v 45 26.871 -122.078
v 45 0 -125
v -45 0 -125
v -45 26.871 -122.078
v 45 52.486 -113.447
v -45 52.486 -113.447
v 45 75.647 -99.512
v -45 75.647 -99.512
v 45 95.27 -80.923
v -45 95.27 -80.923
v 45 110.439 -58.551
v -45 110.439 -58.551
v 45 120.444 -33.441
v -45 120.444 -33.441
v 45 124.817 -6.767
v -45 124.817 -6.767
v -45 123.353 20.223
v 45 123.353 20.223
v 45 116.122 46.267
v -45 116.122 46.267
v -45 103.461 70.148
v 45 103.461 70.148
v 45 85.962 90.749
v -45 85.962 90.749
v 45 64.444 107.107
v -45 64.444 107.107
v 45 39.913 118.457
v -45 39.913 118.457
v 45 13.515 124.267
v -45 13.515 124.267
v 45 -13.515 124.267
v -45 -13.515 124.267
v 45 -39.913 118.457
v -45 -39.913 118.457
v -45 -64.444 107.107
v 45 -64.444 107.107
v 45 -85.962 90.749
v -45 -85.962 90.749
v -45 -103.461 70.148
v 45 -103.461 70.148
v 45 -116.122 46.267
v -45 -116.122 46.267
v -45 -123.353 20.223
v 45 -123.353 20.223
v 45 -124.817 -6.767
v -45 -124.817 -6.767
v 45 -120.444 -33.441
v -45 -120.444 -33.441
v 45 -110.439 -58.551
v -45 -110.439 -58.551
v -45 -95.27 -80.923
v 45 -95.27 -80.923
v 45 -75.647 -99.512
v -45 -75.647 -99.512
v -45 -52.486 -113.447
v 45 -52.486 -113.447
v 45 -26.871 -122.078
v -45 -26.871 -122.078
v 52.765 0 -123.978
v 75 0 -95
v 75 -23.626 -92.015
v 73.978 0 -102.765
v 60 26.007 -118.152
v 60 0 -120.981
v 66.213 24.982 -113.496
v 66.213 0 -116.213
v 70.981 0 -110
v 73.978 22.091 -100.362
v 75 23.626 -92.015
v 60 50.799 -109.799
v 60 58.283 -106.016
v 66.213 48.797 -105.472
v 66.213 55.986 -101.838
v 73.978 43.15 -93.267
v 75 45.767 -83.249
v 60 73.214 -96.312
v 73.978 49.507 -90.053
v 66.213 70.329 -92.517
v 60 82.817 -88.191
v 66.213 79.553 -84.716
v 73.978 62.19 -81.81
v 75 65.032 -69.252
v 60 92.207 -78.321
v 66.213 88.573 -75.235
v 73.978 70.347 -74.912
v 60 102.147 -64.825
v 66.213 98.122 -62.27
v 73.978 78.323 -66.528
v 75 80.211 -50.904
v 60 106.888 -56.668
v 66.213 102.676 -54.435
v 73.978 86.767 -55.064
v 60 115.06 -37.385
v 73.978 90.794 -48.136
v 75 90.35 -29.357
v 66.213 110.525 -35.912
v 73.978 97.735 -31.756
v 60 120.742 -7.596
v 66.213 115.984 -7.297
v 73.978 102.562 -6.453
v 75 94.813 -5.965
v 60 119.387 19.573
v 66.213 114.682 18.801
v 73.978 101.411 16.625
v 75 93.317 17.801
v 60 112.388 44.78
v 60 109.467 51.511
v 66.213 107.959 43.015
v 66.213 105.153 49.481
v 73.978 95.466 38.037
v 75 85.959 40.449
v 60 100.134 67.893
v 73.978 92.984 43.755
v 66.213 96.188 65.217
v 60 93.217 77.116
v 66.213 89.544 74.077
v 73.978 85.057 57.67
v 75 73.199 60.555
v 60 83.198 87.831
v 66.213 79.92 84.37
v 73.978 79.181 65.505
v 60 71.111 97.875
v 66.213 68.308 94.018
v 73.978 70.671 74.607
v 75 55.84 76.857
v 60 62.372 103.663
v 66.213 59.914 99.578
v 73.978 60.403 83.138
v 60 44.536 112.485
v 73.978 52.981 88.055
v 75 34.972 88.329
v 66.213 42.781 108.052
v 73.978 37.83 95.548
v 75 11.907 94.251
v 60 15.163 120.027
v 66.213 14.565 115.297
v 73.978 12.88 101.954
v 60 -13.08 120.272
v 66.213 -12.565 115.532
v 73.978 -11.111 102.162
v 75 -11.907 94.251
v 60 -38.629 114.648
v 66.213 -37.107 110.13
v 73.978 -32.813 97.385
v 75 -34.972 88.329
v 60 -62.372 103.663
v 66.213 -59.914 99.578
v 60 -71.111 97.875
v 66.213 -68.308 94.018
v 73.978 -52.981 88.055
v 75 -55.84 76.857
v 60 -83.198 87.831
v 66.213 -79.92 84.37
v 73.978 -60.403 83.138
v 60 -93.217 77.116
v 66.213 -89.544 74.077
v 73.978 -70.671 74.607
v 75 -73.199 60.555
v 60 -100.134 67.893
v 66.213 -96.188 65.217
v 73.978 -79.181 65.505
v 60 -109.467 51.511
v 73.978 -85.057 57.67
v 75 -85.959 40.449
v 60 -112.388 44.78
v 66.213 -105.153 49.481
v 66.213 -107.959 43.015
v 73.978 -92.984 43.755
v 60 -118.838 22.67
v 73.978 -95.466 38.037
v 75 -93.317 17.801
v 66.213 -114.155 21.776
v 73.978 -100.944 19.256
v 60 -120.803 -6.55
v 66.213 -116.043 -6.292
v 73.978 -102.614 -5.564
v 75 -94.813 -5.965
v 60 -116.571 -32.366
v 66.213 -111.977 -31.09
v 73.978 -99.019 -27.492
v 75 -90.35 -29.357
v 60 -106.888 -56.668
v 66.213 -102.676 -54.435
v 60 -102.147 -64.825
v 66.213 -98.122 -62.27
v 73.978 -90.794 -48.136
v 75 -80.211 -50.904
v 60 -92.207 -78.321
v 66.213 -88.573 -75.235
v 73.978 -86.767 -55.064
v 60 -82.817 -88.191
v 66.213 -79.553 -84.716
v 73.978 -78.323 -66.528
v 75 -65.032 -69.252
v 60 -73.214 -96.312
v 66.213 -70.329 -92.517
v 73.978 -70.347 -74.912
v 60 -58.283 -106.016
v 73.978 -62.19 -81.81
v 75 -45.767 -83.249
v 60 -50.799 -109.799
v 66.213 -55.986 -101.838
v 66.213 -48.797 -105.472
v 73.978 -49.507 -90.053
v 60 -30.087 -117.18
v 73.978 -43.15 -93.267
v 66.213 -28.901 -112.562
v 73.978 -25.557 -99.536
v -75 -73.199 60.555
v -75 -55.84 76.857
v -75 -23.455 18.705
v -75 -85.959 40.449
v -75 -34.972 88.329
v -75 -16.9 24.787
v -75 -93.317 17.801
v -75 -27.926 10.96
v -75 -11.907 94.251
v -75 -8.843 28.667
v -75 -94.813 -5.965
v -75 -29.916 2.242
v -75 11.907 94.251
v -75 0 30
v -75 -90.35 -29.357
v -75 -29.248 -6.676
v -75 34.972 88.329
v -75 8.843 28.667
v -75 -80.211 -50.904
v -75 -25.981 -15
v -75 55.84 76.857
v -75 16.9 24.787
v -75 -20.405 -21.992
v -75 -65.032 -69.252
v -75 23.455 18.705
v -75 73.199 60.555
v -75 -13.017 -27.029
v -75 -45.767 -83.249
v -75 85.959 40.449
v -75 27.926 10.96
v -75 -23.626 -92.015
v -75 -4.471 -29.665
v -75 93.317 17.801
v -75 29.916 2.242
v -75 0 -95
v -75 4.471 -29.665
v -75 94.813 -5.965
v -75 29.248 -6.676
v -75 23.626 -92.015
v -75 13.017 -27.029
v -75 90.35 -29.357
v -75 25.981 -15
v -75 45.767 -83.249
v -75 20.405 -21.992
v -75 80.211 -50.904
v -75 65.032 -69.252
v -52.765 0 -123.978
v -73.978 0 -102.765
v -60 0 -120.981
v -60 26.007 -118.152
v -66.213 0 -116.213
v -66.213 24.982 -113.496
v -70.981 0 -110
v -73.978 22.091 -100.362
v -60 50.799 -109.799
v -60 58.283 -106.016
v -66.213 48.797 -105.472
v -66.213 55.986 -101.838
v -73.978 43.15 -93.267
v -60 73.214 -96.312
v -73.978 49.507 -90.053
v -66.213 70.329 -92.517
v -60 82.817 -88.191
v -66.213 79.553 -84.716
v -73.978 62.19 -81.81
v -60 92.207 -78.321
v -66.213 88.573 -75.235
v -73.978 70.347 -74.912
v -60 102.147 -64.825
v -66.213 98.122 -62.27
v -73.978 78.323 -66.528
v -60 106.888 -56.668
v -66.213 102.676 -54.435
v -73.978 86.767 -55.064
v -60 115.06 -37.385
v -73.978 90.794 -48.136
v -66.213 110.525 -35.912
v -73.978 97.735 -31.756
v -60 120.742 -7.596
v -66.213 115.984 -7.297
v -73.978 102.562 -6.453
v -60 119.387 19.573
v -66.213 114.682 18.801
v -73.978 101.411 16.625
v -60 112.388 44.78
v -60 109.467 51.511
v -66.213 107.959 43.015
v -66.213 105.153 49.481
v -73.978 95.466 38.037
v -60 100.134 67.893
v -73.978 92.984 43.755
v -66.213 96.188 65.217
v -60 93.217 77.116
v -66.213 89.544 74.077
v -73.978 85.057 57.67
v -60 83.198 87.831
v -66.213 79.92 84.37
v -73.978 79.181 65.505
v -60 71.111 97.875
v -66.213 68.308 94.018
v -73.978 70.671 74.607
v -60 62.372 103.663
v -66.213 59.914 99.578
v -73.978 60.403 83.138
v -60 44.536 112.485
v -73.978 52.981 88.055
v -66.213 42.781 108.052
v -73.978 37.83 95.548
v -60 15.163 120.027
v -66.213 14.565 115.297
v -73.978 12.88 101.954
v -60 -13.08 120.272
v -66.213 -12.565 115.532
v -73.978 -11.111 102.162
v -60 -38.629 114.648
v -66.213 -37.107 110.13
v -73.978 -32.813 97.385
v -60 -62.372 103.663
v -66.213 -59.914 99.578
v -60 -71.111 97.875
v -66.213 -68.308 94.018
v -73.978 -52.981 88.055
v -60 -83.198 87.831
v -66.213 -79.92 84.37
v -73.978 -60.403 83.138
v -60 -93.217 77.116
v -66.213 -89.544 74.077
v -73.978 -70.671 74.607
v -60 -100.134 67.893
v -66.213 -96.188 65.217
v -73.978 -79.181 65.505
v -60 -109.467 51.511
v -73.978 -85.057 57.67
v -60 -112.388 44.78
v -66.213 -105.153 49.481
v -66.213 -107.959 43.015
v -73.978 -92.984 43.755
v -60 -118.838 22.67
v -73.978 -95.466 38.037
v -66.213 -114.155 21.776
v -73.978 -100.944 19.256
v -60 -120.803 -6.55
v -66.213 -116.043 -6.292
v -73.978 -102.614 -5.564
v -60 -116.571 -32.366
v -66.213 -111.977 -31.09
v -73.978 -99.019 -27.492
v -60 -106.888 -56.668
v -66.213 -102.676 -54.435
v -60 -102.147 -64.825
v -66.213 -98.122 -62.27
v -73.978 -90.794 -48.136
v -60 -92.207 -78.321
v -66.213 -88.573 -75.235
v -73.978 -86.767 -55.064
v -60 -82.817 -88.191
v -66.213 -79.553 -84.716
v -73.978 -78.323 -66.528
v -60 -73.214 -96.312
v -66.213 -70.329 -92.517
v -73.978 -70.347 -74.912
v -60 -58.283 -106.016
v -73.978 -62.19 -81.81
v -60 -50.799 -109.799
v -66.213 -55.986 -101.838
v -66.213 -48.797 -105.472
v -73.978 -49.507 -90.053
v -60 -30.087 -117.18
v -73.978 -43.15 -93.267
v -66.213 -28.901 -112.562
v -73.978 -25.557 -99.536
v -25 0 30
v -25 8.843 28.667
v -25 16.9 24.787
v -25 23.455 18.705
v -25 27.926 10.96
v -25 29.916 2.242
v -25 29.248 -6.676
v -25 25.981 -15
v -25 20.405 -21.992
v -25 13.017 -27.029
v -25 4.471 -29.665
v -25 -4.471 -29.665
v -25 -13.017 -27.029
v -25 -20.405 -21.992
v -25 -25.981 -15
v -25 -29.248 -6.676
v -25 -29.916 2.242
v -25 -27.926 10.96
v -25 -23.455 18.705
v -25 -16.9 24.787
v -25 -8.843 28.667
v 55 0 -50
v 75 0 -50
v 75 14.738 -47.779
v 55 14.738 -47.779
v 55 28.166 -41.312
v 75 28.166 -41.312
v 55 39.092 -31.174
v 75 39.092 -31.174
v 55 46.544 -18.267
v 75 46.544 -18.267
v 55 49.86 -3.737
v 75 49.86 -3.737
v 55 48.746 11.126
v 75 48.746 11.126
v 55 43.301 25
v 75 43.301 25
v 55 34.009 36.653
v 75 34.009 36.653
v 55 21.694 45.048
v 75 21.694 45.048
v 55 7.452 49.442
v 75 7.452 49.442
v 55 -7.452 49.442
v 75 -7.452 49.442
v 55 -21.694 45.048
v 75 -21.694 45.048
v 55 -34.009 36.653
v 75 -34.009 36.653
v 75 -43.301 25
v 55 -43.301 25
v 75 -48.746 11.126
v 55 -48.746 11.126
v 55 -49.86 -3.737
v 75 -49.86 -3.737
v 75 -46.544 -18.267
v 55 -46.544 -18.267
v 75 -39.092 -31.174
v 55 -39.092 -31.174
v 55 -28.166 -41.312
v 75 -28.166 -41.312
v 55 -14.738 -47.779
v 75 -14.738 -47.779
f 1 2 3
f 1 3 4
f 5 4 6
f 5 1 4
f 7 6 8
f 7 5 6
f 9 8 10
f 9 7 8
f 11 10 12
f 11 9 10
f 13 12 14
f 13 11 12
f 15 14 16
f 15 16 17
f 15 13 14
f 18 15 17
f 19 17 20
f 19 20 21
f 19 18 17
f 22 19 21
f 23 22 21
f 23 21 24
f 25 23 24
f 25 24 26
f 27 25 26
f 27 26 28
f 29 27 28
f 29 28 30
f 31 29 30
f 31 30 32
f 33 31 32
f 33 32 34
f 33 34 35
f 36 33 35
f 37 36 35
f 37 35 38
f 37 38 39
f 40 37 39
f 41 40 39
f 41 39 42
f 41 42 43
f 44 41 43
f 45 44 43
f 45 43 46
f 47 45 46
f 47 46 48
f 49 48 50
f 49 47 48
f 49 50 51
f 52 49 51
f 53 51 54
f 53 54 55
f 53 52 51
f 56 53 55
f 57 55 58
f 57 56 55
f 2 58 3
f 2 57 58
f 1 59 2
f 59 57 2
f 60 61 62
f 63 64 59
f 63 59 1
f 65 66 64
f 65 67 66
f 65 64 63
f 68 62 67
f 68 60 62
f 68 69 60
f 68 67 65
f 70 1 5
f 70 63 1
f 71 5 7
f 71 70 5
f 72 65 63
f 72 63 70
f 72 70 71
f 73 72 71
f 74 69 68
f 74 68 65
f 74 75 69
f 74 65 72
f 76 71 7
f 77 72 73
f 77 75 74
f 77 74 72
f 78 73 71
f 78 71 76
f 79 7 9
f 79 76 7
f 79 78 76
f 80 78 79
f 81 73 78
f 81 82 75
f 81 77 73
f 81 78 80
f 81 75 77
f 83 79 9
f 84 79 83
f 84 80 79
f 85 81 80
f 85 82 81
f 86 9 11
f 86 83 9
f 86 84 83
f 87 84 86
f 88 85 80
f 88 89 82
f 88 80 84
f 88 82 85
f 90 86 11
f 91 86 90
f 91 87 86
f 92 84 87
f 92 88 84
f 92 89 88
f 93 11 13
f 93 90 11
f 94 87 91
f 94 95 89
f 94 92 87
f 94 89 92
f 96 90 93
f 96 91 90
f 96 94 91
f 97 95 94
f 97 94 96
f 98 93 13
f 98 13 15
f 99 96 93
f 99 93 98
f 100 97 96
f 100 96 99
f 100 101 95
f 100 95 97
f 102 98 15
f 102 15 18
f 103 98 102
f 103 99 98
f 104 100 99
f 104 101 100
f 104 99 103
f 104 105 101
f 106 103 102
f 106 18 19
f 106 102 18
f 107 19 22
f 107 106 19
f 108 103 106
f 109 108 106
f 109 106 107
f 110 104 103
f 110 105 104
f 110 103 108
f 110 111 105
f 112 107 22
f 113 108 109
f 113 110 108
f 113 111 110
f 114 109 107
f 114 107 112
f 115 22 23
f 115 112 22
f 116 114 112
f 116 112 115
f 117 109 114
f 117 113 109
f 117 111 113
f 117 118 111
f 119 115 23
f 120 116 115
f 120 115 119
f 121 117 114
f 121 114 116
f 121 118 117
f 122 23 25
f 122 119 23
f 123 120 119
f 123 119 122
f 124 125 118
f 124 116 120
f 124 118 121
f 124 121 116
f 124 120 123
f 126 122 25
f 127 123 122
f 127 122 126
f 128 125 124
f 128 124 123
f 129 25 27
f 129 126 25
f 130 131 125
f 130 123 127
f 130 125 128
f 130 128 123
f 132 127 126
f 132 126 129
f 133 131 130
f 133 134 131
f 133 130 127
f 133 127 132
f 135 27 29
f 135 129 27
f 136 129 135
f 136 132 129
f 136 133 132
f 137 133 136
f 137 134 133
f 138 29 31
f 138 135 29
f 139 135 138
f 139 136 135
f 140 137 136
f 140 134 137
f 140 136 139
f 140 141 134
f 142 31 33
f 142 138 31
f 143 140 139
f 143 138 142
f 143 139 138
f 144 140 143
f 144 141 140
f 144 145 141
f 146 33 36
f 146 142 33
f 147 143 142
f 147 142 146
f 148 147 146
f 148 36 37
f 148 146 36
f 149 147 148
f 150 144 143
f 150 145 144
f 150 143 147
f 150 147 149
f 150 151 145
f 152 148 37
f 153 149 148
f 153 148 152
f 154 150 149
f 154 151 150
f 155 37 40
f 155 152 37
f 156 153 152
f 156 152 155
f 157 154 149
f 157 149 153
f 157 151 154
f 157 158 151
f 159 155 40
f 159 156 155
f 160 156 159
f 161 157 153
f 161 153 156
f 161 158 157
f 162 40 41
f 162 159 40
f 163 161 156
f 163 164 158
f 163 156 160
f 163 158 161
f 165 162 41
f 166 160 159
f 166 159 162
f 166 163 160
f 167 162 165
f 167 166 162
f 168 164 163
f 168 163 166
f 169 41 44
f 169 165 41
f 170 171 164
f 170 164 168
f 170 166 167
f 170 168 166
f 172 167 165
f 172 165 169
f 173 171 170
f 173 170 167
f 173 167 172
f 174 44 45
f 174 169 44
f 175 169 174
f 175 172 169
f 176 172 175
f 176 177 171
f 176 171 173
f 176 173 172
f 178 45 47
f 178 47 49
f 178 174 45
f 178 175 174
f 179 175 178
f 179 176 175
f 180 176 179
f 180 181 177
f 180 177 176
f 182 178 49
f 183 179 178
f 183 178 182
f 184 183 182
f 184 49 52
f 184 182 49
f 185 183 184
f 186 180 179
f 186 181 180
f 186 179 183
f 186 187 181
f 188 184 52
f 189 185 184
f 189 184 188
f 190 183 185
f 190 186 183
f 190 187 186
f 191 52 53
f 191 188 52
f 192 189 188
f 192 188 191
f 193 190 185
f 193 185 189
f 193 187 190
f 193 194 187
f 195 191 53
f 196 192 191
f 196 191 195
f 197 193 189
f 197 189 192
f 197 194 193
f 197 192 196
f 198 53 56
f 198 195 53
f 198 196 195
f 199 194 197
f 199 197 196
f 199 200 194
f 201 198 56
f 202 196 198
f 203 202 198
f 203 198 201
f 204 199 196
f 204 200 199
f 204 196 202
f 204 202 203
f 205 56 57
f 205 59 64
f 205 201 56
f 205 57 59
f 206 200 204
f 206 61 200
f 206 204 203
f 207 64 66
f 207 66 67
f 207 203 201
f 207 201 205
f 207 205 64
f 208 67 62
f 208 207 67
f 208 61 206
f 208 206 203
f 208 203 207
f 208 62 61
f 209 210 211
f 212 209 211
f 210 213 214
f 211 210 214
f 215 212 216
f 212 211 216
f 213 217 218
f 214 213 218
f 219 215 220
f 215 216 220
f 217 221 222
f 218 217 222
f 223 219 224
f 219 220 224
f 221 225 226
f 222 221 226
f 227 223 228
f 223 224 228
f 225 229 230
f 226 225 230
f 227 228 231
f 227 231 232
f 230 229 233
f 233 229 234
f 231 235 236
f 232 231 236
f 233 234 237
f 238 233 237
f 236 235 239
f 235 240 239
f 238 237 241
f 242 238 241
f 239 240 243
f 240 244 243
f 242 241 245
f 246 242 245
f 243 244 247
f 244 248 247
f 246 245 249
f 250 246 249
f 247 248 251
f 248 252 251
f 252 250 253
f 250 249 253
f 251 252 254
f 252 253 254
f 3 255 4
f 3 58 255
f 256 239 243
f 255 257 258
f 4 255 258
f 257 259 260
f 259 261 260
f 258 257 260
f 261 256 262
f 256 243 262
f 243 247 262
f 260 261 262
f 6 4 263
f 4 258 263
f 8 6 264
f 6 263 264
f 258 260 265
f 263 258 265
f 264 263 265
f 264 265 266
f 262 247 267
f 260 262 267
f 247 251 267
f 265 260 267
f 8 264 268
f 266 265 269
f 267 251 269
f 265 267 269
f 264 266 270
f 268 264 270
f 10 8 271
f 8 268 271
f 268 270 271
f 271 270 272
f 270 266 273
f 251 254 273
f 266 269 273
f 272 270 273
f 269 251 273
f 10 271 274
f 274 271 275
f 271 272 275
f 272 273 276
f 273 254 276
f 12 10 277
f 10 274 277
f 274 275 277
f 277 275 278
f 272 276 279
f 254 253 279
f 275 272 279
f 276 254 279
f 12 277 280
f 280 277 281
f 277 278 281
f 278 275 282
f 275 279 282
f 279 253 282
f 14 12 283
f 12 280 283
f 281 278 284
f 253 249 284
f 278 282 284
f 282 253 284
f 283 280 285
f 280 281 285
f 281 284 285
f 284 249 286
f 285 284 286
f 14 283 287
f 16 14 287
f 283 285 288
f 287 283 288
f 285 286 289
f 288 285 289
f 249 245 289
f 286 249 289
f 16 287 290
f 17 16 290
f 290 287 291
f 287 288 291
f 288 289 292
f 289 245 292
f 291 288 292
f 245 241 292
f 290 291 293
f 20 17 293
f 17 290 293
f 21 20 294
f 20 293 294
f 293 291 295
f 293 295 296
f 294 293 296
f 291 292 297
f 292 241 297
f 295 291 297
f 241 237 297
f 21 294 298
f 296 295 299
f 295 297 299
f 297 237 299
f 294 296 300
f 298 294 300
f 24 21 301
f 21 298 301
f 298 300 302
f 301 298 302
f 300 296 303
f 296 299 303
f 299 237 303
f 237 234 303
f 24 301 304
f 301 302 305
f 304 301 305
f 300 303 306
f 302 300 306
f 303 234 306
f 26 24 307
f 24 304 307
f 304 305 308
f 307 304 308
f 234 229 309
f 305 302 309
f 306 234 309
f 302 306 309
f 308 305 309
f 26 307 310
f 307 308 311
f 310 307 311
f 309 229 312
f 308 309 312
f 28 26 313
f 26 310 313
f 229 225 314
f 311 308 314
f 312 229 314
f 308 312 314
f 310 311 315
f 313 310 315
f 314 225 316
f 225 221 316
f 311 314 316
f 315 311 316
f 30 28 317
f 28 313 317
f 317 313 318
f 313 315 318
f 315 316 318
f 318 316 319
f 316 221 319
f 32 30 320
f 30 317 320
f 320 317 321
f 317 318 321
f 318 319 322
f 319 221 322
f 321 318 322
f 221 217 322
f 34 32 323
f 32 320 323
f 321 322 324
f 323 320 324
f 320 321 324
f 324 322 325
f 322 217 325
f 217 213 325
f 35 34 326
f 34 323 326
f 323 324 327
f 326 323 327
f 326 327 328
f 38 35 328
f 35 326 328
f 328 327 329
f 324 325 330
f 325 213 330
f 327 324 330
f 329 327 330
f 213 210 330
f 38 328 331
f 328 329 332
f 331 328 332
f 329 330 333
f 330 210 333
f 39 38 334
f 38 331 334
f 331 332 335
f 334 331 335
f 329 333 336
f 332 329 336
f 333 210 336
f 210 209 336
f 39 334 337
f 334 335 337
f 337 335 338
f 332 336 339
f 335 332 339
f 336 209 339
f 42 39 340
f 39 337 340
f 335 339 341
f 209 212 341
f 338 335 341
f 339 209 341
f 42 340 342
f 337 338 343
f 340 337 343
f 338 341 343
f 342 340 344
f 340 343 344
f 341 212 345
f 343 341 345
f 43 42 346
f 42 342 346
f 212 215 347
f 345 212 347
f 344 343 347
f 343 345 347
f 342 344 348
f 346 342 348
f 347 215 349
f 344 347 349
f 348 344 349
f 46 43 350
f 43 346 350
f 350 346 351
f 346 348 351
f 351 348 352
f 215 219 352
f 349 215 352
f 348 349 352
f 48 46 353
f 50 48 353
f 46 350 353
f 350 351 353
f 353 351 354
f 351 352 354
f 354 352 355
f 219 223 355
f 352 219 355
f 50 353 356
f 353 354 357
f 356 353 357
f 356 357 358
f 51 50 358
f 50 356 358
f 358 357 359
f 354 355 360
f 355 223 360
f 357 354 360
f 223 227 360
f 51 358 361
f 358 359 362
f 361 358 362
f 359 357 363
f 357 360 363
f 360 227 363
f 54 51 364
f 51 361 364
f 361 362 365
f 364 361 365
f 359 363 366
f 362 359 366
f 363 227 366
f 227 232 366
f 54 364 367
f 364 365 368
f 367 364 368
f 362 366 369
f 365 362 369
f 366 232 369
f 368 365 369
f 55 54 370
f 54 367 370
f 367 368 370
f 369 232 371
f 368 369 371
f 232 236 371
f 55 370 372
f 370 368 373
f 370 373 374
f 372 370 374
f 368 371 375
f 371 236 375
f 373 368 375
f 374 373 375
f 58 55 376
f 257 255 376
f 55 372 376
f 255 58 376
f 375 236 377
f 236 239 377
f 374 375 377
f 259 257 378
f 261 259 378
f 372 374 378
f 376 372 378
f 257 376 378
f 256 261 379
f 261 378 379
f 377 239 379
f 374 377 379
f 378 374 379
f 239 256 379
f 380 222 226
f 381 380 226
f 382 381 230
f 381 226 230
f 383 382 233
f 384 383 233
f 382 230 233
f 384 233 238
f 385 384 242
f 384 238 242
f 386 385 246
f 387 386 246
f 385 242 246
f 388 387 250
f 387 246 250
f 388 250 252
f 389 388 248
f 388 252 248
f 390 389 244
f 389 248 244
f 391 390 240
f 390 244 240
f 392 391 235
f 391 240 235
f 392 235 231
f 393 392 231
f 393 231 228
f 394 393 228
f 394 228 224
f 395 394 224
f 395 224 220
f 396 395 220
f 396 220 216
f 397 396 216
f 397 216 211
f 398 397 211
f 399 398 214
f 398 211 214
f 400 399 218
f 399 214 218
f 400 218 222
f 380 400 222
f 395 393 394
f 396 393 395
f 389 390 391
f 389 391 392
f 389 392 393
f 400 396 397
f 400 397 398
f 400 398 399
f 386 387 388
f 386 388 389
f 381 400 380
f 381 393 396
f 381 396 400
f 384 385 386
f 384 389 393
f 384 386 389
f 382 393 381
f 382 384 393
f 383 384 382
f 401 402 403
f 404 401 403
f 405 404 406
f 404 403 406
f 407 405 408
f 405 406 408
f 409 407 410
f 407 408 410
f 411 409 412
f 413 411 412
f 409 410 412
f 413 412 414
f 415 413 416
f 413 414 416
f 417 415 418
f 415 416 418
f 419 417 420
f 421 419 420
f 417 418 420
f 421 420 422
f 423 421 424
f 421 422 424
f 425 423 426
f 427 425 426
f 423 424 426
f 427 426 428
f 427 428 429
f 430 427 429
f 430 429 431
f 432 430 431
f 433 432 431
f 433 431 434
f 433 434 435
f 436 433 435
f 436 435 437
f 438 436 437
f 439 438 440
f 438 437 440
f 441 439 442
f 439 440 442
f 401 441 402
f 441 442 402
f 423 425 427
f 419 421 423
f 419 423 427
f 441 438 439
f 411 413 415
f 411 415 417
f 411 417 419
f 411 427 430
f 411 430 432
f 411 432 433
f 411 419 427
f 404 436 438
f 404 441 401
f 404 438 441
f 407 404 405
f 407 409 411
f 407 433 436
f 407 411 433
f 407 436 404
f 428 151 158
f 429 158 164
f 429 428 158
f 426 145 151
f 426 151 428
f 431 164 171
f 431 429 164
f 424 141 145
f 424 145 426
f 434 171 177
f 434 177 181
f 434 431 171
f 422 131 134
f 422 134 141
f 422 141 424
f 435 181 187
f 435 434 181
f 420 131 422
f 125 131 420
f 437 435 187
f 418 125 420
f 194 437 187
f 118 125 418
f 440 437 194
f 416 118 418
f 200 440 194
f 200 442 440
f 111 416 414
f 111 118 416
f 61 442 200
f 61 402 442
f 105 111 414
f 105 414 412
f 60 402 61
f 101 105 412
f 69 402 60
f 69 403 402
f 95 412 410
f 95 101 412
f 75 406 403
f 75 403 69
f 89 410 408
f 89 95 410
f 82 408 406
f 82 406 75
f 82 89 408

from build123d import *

# Parameters (mm, degrees)
SKETCH1_R           = 125
BOSS_EXTRUDE1_DEPTH = 75
FILLET1_R           = 30
SKETCH2_R           = 50
CUT_EXTRUDE1_DEPTH  = 20
SKETCH3_R           = 30
CUT_EXTRUDE2_DEPTH  = 50


with BuildPart() as part:
    # Sketch1 → Boss-Extrude1 (new, symmetric)
    with BuildSketch(Plane(origin=(0, 0, 0), x_dir=(0, 0, -1), z_dir=(1, 0, 0))):
        Circle(SKETCH1_R)
    extrude(amount=BOSS_EXTRUDE1_DEPTH, both=True)

    # Fillet1
    fillet1_edges = [part.edges().sort_by_distance(p)[0] for p in [
        (-75, 0, 125),
        (75, 0, 125),
    ]]
    fillet(fillet1_edges, radius=FILLET1_R)

    # Sketch2 → Cut-Extrude1 (cut)
    with BuildSketch(Plane(origin=(75, 0, 0), x_dir=(0, 0, -1), z_dir=(1, 0, 0))):
        Circle(SKETCH2_R)
    extrude(amount=-CUT_EXTRUDE1_DEPTH, mode=Mode.SUBTRACT)

    # Sketch3 → Cut-Extrude2 (cut)
    with BuildSketch(Plane.ZY.offset(75)):
        Circle(SKETCH3_R)
    extrude(amount=-CUT_EXTRUDE2_DEPTH, mode=Mode.SUBTRACT)


solid = part.part
